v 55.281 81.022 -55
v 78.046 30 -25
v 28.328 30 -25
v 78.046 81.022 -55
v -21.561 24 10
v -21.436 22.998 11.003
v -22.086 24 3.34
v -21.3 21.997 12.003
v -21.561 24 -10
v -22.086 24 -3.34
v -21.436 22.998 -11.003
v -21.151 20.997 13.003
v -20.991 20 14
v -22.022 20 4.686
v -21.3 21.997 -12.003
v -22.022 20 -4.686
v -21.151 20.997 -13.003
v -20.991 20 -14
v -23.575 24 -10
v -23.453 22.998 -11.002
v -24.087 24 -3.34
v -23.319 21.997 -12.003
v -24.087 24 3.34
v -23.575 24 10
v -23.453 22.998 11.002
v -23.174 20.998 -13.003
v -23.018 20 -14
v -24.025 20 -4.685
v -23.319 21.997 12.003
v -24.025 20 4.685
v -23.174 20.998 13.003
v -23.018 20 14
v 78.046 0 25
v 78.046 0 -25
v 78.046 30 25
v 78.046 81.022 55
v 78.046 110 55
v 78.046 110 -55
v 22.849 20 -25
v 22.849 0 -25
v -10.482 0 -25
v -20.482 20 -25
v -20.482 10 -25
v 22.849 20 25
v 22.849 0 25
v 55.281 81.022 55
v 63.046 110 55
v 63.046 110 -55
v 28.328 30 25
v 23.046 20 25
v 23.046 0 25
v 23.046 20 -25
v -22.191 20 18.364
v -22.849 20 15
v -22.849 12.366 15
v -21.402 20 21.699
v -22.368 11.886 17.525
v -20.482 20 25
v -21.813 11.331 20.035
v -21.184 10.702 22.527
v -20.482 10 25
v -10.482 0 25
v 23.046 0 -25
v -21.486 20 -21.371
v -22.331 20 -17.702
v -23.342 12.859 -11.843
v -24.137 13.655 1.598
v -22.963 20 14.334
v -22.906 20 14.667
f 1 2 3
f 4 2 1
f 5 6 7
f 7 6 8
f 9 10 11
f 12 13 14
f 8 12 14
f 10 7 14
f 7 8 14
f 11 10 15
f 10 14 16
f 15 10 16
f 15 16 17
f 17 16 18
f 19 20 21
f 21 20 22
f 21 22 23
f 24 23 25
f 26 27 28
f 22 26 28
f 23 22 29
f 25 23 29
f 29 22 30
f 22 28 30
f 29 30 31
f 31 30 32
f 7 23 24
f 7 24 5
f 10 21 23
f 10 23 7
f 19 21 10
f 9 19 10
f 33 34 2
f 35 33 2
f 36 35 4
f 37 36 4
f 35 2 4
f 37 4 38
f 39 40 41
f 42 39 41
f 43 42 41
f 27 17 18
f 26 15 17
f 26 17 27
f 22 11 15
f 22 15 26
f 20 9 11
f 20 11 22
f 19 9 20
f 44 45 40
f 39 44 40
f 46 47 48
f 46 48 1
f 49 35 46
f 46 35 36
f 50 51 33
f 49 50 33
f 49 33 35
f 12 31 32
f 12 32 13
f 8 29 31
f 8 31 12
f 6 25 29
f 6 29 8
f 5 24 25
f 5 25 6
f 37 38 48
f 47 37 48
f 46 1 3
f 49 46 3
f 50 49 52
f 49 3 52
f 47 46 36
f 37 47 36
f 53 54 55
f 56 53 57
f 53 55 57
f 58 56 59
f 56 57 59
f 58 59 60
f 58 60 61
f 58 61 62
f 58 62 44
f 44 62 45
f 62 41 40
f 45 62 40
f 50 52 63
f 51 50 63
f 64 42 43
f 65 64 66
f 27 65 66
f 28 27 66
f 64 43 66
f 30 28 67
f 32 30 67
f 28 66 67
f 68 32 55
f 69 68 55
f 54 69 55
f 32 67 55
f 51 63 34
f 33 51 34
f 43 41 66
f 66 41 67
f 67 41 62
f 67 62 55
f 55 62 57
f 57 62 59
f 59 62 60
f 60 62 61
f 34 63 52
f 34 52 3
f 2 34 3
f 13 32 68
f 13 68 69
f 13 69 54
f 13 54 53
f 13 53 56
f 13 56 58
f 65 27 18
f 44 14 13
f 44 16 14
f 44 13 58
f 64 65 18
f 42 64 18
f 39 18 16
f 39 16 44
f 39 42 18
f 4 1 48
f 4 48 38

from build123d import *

# Parameters (mm, degrees)
DODANIE_WYCI_GNI_CIE1_DEPTH      = 20
WYTNIJ_WYCI_GNI_CIE1_DEPTH       = 60.019416665
DODANIE_WYCI_GNI_CIE2_DEPTH      = 4
SFAZOWANIE1_SIZE                 = 4
DODANIE_WYCI_GNI_CIE3_DEPTH      = 30
DODANIE_WYCI_GNI_CIE3_DEPTH_BACK = 80
WYTNIJ_WYCI_GNI_CIE2_DEPTH       = 160.903895728


with BuildPart() as part:
    # Szkic1 → Dodanie-wyciągnięcie1 (new body)
    with BuildSketch(Plane(origin=(0, 0, 0), x_dir=(1, 0, 0), z_dir=(0, 1, 0))):
        with BuildLine():
            Line((22.848570571, -15), (22.848570571, 25))
            Line((22.848570571, 25), (-20.482096053, 25))
            ThreePointArc((-20.482096053, 25), (-23.999572469, 5.138097937), (-22.848570571, -15))
            ThreePointArc((-22.848570571, -15), (-21.813108774, -20.034970687), (-20.482096053, -25))
            Line((-20.482096053, -25), (22.848570571, -25))
            Line((22.848570571, -25), (22.848570571, -15))
        make_face()
    extrude(amount=DODANIE_WYCI_GNI_CIE1_DEPTH)

    # Szkic2 → Wytnij-wyciągnięcie1 (cut, through all)
    with BuildSketch(Plane.XY.offset(25)):
        Polygon((-10.482096053, 0), (-25.036409358, 14.554313306), (-25.036409358, -2.735429271), (-10.482096053, -2.735429271), align=None)
    extrude(amount=-WYTNIJ_WYCI_GNI_CIE1_DEPTH, mode=Mode.SUBTRACT)

    # Szkic3 → Dodanie-wyciągnięcie2 (add)
    with BuildSketch(Plane(origin=(0, 20, 0), x_dir=(1, 0, 0), z_dir=(0, 1, 0))):
        with BuildLine():
            Line((-23.017604376, -14), (-20.990561104, -14))
            ThreePointArc((-20.990561104, -14), (-22.151429429, 0), (-20.990561104, 14))
            Line((-20.990561104, 14), (-23.017604376, 14))
            ThreePointArc((-23.017604376, 14), (-24.151429429, 0), (-23.017604376, -14))
        make_face()
    extrude(amount=DODANIE_WYCI_GNI_CIE2_DEPTH)

    # Sfazowanie1
    sfazowanie1_edges = [part.edges().sort_by_distance(p)[0] for p in [
        (-22.00408274, 24, -14),
        (-22.00408274, 24, 14),
    ]]
    chamfer(sfazowanie1_edges, length=SFAZOWANIE1_SIZE - 0.0001)  # a hair under: the kernel refuses the full size


with BuildPart() as body_2:
    # Szkic4 → Dodanie-wyciągnięcie3 (new, two sides: drawn at the far end of the back side and taken through both)
    with BuildSketch(Plane.XY.offset(25).offset(-DODANIE_WYCI_GNI_CIE3_DEPTH_BACK)):
        Polygon((63.045712747, 110), (55.281141394, 81.022225211), (23.045712747, 20), (23.045712747, 0), (63.045712747, 0), (78.045712747, 0), (78.045712747, 110), align=None)
    extrude(amount=DODANIE_WYCI_GNI_CIE3_DEPTH + DODANIE_WYCI_GNI_CIE3_DEPTH_BACK)

    # Szkic5 → Wytnij-wyciągnięcie2 (cut, through all)
    with BuildSketch(Plane(origin=(78.045712747, 0, 0), x_dir=(0, 0, -1), z_dir=(1, 0, 0))):
        Polygon((-55, 0), (-25, 0), (-25, 30), (-55, 81.022225211), align=None)
    wytnij_wyci_gni_cie2 = extrude(amount=-WYTNIJ_WYCI_GNI_CIE2_DEPTH, mode=Mode.SUBTRACT)

    # Lustro1: Wytnij-wyciągnięcie2 across plane
    add(wytnij_wyci_gni_cie2.mirror(Plane.XY), mode=Mode.SUBTRACT)


solid = Compound([part.part, body_2.part])
